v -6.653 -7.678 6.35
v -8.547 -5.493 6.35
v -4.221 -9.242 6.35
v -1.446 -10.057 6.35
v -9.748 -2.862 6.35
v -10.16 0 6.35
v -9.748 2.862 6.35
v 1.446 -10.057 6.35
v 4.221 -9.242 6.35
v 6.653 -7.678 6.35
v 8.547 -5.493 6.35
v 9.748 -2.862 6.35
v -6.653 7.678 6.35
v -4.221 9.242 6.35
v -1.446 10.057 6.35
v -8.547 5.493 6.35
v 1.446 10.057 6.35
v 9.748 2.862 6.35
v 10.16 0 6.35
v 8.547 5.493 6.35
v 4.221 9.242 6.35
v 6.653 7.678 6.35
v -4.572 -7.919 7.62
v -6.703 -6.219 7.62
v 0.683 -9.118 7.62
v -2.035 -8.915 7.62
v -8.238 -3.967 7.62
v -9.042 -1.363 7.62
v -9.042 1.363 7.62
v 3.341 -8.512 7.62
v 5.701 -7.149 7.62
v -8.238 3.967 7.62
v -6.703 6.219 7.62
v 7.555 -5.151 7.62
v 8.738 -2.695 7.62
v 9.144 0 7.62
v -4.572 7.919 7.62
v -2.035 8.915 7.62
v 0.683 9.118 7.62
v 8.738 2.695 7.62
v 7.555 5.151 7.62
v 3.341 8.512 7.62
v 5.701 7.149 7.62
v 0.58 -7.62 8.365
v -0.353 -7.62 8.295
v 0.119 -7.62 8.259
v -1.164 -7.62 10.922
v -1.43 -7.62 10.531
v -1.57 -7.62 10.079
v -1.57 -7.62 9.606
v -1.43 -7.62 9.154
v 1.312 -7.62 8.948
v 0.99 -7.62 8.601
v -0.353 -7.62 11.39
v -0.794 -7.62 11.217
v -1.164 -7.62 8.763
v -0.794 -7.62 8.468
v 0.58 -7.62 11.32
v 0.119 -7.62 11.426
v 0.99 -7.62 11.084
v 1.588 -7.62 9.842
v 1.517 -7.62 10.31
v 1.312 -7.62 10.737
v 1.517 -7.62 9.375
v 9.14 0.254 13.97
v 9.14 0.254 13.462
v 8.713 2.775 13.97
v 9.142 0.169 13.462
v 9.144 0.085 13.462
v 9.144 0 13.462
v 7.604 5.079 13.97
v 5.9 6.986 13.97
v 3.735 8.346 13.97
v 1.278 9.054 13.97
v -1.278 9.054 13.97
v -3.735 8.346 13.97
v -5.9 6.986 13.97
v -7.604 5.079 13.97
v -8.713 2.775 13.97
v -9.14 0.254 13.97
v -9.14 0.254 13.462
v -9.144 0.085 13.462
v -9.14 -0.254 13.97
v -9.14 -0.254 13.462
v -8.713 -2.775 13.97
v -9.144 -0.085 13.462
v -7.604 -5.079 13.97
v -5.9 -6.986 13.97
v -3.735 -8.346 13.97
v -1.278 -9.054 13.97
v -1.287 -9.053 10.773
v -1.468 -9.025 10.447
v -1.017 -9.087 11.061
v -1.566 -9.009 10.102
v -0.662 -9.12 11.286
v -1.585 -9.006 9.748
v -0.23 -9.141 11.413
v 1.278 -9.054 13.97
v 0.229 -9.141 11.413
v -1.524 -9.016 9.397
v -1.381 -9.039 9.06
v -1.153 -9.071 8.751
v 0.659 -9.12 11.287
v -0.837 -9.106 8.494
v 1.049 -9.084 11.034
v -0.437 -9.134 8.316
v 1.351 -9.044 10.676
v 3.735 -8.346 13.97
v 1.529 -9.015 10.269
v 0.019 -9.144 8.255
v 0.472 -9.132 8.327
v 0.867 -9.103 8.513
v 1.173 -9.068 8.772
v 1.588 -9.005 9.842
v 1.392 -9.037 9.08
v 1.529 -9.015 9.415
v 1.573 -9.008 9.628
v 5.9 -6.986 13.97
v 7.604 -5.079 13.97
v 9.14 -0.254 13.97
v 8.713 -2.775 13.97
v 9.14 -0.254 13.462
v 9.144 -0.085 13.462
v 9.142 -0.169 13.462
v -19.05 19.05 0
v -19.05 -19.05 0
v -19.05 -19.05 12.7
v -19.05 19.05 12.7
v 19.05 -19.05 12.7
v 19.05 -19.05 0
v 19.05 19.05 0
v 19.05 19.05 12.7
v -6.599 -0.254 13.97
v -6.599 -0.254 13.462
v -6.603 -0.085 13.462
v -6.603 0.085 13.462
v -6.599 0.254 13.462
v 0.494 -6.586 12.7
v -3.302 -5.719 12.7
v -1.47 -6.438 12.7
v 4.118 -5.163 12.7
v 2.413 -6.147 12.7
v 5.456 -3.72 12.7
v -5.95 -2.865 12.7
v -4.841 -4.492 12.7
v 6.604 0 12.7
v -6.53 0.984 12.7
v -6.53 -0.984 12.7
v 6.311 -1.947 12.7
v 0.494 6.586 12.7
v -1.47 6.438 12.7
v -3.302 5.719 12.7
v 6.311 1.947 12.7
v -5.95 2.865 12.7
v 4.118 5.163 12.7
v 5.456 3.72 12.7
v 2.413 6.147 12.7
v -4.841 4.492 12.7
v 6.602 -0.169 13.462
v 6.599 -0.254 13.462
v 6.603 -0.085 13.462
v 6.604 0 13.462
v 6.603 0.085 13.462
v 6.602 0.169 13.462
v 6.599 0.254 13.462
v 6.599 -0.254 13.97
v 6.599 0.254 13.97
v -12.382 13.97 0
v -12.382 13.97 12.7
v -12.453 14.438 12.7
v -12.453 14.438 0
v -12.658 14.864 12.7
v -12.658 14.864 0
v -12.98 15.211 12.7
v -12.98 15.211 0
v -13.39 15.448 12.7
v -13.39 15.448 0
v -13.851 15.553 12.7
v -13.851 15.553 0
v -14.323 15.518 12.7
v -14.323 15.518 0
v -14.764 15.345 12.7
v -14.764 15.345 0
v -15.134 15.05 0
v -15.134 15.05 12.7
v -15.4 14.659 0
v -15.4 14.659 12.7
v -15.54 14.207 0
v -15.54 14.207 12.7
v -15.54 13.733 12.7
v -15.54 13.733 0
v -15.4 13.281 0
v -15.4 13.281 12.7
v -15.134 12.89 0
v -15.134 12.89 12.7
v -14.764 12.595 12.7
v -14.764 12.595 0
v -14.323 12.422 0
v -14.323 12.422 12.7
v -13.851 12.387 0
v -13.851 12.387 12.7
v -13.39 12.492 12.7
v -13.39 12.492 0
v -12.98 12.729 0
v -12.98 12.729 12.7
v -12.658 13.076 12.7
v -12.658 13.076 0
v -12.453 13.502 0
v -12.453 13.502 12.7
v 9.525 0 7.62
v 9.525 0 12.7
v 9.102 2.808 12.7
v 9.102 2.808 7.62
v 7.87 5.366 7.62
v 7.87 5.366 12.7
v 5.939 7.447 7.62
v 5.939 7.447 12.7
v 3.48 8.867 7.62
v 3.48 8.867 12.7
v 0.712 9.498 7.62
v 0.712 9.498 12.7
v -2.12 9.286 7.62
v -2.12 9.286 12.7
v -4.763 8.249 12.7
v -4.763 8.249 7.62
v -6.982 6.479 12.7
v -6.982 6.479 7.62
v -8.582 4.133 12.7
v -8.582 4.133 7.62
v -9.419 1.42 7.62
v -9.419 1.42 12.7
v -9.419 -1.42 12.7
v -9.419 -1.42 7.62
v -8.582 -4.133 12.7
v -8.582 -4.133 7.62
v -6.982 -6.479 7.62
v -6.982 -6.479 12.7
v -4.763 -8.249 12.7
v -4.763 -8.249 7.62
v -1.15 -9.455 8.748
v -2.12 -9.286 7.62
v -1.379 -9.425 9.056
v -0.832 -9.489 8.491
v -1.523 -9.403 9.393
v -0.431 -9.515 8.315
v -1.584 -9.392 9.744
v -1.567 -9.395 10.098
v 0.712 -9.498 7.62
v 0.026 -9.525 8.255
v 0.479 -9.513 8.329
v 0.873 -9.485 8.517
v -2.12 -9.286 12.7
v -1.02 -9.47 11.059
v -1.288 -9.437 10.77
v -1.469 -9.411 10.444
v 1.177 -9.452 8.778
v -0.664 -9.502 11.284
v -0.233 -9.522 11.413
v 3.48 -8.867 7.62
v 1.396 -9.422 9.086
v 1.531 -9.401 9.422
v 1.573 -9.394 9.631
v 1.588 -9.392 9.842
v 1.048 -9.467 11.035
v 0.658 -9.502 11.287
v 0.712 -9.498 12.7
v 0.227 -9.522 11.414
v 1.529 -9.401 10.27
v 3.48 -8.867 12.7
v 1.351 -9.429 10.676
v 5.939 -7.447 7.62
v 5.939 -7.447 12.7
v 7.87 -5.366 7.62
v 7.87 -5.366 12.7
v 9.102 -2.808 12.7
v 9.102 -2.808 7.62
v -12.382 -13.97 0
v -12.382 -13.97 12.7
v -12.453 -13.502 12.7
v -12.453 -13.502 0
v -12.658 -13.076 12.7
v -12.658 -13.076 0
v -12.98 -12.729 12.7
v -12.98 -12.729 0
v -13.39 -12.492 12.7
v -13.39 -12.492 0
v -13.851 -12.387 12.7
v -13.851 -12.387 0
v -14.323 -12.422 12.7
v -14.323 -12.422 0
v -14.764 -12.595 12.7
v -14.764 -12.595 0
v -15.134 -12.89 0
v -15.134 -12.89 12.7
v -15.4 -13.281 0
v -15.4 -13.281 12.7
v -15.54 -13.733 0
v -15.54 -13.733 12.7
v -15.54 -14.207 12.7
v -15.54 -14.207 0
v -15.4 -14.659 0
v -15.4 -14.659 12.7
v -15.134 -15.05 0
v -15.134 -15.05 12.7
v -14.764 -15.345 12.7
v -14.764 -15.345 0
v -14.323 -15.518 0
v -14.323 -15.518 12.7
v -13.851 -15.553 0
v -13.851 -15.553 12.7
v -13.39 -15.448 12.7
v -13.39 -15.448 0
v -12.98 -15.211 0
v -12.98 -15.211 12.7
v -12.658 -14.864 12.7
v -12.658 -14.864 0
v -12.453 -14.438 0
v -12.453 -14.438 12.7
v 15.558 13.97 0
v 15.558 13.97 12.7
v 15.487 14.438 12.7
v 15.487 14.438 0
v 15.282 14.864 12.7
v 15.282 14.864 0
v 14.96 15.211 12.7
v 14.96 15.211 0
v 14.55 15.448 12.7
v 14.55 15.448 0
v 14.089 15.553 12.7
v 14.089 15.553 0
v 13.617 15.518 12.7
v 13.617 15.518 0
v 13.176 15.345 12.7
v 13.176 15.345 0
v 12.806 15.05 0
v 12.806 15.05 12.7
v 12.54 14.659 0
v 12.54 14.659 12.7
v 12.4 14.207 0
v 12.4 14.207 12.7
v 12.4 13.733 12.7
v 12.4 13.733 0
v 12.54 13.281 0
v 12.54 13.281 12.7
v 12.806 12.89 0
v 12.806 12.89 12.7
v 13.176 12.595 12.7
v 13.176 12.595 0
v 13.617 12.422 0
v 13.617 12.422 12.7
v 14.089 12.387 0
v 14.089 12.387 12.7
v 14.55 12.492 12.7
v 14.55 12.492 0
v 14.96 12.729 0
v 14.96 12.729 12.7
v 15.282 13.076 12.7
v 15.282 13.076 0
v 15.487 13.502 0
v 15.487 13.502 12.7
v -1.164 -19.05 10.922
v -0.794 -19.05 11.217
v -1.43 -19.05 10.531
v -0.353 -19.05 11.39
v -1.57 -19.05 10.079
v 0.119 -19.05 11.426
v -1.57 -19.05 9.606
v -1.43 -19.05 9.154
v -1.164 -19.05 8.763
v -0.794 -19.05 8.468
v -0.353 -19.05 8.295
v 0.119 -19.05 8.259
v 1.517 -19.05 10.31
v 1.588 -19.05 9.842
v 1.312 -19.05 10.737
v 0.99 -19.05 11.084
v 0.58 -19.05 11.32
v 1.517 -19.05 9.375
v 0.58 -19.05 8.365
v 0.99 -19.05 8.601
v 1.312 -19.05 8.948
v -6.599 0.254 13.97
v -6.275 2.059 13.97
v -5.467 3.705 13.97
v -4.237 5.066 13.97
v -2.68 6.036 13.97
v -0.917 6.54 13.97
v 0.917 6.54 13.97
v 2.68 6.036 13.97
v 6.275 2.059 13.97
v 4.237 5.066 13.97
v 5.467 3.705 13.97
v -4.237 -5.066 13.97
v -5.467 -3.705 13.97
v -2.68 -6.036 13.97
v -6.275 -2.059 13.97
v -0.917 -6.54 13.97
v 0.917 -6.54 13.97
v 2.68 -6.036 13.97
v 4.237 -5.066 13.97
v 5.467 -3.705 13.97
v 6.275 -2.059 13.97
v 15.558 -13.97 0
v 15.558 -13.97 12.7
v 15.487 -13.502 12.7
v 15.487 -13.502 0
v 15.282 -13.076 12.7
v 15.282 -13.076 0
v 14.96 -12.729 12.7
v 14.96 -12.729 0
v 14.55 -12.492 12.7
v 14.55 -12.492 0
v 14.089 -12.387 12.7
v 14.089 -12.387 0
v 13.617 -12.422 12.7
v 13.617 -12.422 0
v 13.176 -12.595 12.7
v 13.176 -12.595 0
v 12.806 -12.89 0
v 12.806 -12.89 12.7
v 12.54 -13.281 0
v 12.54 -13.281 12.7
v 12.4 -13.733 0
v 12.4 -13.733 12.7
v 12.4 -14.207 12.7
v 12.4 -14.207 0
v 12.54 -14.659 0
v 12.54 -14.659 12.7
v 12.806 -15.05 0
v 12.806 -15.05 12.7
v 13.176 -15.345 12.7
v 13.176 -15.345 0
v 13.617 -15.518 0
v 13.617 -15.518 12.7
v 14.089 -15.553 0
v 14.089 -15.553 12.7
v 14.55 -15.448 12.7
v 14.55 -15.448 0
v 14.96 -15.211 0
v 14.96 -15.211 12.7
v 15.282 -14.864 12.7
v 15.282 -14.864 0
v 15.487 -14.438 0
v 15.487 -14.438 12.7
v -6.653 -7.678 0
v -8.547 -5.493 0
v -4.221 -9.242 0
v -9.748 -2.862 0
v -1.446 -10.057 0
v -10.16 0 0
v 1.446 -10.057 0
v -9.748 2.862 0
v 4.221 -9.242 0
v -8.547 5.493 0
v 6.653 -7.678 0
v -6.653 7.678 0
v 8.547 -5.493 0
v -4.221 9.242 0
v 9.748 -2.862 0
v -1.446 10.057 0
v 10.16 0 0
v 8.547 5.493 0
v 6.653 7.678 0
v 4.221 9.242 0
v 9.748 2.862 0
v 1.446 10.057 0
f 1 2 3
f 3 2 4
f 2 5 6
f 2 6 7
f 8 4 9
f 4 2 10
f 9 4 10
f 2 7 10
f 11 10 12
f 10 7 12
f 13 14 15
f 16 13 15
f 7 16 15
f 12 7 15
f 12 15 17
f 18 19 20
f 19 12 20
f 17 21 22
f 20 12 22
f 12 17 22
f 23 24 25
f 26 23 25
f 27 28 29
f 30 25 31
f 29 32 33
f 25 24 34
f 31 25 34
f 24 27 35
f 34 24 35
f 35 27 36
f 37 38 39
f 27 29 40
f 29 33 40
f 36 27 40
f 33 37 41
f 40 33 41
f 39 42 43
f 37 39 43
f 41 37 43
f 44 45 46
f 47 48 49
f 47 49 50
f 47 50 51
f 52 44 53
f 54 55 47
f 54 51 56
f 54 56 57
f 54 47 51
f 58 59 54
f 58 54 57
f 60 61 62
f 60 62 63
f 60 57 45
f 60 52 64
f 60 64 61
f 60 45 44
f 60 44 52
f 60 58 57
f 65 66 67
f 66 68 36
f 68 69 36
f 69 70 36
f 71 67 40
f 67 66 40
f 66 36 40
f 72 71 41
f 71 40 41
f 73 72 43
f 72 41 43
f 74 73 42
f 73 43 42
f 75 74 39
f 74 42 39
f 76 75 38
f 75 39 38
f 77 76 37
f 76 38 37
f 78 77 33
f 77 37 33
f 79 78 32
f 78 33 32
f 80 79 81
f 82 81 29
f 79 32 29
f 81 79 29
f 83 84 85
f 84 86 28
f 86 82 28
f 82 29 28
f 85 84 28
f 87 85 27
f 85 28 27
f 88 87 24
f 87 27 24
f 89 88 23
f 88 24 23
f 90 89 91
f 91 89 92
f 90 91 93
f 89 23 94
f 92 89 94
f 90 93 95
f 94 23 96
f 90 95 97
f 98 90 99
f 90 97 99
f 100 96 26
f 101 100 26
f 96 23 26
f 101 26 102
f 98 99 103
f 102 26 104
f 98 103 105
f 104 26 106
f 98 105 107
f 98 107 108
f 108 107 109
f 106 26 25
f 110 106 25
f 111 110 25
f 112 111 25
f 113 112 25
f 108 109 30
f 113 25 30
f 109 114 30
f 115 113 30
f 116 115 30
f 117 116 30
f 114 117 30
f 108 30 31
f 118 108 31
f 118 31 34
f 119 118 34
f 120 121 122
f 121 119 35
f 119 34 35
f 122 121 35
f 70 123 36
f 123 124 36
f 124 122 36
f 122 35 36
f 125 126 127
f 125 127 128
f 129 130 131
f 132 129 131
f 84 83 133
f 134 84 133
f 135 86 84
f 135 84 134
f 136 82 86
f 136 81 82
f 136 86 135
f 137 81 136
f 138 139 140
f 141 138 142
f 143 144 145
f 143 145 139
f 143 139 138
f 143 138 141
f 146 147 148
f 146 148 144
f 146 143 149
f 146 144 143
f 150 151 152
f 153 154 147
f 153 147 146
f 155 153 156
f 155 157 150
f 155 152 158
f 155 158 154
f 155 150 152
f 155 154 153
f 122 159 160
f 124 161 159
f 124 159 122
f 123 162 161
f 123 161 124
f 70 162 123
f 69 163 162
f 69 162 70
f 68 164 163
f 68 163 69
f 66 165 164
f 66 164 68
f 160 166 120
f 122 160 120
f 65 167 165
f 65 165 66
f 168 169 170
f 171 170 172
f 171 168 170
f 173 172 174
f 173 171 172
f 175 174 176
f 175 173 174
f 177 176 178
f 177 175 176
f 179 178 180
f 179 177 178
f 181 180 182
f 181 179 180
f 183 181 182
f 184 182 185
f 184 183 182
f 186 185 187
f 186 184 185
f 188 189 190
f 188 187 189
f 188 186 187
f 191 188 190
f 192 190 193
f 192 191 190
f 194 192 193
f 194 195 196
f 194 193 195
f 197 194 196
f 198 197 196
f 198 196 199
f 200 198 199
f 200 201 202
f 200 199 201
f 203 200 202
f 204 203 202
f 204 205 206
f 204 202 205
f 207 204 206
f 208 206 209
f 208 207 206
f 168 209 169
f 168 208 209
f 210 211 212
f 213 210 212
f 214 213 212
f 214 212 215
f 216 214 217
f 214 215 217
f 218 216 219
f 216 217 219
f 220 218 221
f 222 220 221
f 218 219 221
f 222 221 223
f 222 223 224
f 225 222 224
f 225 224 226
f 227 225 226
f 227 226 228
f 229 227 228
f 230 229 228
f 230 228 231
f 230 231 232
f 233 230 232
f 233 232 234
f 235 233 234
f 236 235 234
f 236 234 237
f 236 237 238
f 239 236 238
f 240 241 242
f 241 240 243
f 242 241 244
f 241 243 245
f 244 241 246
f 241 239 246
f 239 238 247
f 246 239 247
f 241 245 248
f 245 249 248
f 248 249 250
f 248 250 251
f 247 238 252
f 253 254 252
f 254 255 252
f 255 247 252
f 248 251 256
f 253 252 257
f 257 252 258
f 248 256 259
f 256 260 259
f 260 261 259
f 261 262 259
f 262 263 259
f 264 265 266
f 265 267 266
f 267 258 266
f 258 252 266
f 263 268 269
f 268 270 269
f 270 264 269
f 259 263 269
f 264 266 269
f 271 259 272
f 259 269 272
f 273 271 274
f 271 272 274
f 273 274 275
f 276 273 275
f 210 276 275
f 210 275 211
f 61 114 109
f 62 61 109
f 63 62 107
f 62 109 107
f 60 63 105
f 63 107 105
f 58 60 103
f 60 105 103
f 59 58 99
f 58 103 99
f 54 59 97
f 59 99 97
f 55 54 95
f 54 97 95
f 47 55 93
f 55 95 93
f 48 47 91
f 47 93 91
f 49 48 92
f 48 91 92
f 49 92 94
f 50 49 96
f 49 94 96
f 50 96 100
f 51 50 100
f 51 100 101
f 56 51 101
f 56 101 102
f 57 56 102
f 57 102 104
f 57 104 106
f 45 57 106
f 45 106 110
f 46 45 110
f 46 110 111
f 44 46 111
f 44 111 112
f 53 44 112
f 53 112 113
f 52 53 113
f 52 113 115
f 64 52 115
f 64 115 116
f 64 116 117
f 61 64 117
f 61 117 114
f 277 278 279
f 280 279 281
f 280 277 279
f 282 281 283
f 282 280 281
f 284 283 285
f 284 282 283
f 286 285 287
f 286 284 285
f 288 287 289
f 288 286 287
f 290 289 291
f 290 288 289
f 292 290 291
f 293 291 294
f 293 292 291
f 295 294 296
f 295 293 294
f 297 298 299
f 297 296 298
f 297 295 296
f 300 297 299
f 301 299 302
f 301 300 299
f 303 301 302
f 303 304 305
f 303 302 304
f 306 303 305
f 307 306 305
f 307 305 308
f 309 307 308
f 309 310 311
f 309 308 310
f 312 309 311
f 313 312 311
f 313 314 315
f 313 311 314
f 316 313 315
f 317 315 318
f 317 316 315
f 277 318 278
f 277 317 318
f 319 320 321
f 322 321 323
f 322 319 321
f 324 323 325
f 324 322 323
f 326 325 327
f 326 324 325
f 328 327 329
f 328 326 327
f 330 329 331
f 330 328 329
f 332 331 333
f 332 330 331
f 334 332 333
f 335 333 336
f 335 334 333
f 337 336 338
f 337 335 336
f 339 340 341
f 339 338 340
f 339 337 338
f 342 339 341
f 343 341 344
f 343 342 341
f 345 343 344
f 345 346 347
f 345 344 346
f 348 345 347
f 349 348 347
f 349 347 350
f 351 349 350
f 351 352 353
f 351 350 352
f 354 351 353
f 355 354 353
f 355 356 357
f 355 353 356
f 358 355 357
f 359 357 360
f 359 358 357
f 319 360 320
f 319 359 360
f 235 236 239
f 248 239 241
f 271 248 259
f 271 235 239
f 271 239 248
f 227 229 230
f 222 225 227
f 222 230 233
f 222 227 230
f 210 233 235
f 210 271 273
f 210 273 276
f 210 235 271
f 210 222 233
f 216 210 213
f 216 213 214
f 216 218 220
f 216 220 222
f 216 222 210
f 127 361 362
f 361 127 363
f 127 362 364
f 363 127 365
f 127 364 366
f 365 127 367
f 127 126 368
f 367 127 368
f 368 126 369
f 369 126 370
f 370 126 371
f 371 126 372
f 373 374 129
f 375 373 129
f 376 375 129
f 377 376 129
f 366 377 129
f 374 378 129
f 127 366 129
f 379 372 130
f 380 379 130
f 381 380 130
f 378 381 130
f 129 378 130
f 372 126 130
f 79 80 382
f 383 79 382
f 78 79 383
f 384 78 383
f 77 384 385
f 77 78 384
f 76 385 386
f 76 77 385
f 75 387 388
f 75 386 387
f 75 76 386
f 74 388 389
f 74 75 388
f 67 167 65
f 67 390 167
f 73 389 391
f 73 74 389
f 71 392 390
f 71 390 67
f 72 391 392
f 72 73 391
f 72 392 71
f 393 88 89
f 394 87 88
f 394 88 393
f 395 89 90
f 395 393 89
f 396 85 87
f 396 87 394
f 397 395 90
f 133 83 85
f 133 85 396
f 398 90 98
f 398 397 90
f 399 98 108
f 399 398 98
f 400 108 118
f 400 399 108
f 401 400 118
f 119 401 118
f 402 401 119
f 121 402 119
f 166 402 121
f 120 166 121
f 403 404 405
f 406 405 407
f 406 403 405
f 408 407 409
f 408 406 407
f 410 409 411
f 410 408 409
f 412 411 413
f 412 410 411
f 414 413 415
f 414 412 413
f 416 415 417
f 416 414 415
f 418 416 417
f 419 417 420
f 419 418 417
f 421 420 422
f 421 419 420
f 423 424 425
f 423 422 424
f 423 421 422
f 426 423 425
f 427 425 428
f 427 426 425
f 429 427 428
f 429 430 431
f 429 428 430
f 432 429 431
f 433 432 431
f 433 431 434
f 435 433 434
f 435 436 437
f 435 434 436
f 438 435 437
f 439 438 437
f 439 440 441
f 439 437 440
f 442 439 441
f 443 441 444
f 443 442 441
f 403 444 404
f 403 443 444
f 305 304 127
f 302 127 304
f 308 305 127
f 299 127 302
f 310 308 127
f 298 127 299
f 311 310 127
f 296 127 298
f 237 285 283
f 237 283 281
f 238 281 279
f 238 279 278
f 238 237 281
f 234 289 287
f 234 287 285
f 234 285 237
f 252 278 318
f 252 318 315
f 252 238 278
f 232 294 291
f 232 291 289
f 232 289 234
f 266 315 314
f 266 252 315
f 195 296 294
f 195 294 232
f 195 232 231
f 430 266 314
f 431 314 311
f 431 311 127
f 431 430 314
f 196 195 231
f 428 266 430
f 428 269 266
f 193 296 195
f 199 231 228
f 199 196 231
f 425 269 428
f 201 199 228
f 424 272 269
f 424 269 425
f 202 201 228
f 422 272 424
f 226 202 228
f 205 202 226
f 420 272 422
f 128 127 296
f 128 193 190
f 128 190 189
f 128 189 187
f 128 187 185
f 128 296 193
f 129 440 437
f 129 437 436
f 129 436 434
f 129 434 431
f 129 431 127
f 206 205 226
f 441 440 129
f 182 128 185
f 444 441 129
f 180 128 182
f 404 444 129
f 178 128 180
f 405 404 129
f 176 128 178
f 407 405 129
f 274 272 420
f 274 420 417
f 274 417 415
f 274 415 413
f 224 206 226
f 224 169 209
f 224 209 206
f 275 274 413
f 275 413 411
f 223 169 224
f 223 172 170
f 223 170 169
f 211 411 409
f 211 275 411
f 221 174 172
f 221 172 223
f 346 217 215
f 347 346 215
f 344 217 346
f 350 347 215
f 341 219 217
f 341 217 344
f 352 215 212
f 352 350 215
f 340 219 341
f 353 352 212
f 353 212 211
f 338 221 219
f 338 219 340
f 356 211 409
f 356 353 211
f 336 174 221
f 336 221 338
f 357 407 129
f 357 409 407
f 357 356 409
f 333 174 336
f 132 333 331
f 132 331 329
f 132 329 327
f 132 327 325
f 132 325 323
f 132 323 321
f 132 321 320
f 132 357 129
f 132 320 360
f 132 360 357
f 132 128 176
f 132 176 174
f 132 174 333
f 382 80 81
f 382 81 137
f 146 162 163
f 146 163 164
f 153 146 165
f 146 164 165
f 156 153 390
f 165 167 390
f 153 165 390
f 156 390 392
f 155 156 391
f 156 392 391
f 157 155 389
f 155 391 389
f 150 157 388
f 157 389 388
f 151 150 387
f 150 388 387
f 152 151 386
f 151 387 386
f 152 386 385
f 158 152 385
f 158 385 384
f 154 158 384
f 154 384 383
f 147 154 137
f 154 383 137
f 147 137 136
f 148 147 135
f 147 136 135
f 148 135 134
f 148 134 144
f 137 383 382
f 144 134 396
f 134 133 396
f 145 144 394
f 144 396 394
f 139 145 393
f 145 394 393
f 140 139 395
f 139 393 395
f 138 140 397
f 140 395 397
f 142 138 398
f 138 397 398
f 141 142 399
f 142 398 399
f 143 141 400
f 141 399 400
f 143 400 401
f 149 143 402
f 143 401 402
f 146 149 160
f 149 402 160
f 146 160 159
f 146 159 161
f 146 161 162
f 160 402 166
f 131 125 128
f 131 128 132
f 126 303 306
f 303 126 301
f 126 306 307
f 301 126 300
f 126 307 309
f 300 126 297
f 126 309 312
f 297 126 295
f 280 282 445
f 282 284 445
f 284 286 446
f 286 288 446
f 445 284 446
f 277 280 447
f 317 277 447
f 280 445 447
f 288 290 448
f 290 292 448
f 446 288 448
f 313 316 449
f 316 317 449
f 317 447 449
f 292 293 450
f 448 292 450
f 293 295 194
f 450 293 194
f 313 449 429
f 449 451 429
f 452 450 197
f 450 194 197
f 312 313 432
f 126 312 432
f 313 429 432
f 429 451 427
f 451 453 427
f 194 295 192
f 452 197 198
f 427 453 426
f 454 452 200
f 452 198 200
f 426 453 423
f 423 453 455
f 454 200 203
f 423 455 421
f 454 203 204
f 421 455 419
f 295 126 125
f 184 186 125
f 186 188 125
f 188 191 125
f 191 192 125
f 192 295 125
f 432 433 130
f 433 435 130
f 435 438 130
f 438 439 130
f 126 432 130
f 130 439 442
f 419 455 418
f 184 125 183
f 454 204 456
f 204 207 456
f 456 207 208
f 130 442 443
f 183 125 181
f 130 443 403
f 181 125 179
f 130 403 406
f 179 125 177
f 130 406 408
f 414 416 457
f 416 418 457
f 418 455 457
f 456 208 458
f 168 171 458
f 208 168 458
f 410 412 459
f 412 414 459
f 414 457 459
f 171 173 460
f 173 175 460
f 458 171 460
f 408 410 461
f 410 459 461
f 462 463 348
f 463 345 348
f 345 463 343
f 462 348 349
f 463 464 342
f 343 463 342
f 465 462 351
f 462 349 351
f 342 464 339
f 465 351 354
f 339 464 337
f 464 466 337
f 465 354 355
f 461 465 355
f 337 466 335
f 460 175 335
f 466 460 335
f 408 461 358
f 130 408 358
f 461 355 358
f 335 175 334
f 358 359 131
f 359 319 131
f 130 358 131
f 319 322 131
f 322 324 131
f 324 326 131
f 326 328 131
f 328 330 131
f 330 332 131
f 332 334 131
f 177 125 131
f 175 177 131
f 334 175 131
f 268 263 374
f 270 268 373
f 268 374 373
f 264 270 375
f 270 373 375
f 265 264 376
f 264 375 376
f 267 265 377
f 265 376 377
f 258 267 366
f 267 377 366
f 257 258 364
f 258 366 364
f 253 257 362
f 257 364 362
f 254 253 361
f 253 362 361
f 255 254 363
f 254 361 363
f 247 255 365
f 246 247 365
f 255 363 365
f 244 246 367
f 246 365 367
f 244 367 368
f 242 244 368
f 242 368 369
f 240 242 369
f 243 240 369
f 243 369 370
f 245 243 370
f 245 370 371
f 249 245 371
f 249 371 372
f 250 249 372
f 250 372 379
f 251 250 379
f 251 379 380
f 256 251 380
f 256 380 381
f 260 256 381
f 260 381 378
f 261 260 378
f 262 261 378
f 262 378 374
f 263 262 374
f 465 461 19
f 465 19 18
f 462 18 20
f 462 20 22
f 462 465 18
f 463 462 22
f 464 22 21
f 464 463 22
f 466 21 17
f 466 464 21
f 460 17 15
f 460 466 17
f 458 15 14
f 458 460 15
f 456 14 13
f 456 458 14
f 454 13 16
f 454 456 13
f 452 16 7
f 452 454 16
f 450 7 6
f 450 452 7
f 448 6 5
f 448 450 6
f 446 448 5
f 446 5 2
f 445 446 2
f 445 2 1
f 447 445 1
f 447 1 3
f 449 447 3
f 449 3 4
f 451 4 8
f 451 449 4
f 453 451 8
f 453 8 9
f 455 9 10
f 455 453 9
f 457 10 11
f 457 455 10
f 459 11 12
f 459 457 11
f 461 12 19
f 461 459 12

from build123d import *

# Parameters (mm, degrees)
F0_W          = 38.1
F0_H          = 38.1
F1_DEPTH      = 12.7
F3_R          = 10.16
F4_DEPTH      = 6.35
F2_R          = 9.525
F5_DEPTH      = 5.08
F6_R          = 1.5875
F7_DEPTH      = 25.4
F8_R          = 9.144
F9_DEPTH      = 5.08
F9_DEPTH_BACK = 1.27
F10_R         = 6.604
F11_DEPTH     = 1.27
F12_R         = 1.5875
F13_DEPTH     = 11.43
F14_W         = 19.05
F14_H         = 0.508
F15_DEPTH     = 0.508


with BuildPart() as f1:
    # F0 (on Top) → F1 (new body)
    with BuildSketch(Plane.XY):
        Rectangle(F0_W, F0_H)
    extrude(amount=F1_DEPTH)

    # F3 (on face) → F4 (cut)
    with BuildSketch(Plane.XY):
        Circle(F3_R)
    extrude(amount=F4_DEPTH, mode=Mode.SUBTRACT)

    # F2 (on face) → F5 (cut)
    with BuildSketch(Plane.XY.offset(12.7)):
        Circle(F2_R)
    extrude(amount=-F5_DEPTH, mode=Mode.SUBTRACT)

    # F6 (on Top) → F7 (cut)
    with BuildSketch(Plane.XY):
        with Locations((-13.97, -13.97)):
            Circle(F6_R)
        with Locations((13.97, -13.97)):
            Circle(F6_R)
        with Locations((13.97, 13.97)):
            Circle(F6_R)
        with Locations((-13.97, 13.97)):
            Circle(F6_R)
    extrude(amount=F7_DEPTH, mode=Mode.SUBTRACT)


with BuildPart() as f9:
    # F8 (on face) → F9 (new body, two sides)
    with BuildSketch(Plane.XY.offset(12.7)) as f9_sk:
        Circle(F8_R)
    extrude(amount=-F9_DEPTH)
    extrude(f9_sk.sketch, amount=F9_DEPTH_BACK)

    # F10 (on face) → F11 (cut)
    with BuildSketch(Plane.XY.offset(13.97)):
        Circle(F10_R)
    extrude(amount=-F11_DEPTH, mode=Mode.SUBTRACT)


with BuildPart() as f13_tool:
    # F12 (on face) → F13 (new body)
    with BuildSketch(Plane.XZ.offset(19.05)):
        with Locations((0, 9.8425)):
            Circle(F12_R)
    extrude(amount=-F13_DEPTH)


with BuildPart() as f1_1:
    add(f1.part)

    # F13: cut by f13_tool
    add(f13_tool.part, mode=Mode.SUBTRACT)


with BuildPart() as f9_1:
    add(f9.part)

    # F13: cut by f13_tool
    add(f13_tool.part, mode=Mode.SUBTRACT)

    # F14 (on face) → F15 (cut)
    with BuildSketch(Plane.XY.offset(13.97)):
        Rectangle(F14_W, F14_H)
    extrude(amount=-F15_DEPTH, mode=Mode.SUBTRACT)


solid = Compound([f1_1.part, f9_1.part])
